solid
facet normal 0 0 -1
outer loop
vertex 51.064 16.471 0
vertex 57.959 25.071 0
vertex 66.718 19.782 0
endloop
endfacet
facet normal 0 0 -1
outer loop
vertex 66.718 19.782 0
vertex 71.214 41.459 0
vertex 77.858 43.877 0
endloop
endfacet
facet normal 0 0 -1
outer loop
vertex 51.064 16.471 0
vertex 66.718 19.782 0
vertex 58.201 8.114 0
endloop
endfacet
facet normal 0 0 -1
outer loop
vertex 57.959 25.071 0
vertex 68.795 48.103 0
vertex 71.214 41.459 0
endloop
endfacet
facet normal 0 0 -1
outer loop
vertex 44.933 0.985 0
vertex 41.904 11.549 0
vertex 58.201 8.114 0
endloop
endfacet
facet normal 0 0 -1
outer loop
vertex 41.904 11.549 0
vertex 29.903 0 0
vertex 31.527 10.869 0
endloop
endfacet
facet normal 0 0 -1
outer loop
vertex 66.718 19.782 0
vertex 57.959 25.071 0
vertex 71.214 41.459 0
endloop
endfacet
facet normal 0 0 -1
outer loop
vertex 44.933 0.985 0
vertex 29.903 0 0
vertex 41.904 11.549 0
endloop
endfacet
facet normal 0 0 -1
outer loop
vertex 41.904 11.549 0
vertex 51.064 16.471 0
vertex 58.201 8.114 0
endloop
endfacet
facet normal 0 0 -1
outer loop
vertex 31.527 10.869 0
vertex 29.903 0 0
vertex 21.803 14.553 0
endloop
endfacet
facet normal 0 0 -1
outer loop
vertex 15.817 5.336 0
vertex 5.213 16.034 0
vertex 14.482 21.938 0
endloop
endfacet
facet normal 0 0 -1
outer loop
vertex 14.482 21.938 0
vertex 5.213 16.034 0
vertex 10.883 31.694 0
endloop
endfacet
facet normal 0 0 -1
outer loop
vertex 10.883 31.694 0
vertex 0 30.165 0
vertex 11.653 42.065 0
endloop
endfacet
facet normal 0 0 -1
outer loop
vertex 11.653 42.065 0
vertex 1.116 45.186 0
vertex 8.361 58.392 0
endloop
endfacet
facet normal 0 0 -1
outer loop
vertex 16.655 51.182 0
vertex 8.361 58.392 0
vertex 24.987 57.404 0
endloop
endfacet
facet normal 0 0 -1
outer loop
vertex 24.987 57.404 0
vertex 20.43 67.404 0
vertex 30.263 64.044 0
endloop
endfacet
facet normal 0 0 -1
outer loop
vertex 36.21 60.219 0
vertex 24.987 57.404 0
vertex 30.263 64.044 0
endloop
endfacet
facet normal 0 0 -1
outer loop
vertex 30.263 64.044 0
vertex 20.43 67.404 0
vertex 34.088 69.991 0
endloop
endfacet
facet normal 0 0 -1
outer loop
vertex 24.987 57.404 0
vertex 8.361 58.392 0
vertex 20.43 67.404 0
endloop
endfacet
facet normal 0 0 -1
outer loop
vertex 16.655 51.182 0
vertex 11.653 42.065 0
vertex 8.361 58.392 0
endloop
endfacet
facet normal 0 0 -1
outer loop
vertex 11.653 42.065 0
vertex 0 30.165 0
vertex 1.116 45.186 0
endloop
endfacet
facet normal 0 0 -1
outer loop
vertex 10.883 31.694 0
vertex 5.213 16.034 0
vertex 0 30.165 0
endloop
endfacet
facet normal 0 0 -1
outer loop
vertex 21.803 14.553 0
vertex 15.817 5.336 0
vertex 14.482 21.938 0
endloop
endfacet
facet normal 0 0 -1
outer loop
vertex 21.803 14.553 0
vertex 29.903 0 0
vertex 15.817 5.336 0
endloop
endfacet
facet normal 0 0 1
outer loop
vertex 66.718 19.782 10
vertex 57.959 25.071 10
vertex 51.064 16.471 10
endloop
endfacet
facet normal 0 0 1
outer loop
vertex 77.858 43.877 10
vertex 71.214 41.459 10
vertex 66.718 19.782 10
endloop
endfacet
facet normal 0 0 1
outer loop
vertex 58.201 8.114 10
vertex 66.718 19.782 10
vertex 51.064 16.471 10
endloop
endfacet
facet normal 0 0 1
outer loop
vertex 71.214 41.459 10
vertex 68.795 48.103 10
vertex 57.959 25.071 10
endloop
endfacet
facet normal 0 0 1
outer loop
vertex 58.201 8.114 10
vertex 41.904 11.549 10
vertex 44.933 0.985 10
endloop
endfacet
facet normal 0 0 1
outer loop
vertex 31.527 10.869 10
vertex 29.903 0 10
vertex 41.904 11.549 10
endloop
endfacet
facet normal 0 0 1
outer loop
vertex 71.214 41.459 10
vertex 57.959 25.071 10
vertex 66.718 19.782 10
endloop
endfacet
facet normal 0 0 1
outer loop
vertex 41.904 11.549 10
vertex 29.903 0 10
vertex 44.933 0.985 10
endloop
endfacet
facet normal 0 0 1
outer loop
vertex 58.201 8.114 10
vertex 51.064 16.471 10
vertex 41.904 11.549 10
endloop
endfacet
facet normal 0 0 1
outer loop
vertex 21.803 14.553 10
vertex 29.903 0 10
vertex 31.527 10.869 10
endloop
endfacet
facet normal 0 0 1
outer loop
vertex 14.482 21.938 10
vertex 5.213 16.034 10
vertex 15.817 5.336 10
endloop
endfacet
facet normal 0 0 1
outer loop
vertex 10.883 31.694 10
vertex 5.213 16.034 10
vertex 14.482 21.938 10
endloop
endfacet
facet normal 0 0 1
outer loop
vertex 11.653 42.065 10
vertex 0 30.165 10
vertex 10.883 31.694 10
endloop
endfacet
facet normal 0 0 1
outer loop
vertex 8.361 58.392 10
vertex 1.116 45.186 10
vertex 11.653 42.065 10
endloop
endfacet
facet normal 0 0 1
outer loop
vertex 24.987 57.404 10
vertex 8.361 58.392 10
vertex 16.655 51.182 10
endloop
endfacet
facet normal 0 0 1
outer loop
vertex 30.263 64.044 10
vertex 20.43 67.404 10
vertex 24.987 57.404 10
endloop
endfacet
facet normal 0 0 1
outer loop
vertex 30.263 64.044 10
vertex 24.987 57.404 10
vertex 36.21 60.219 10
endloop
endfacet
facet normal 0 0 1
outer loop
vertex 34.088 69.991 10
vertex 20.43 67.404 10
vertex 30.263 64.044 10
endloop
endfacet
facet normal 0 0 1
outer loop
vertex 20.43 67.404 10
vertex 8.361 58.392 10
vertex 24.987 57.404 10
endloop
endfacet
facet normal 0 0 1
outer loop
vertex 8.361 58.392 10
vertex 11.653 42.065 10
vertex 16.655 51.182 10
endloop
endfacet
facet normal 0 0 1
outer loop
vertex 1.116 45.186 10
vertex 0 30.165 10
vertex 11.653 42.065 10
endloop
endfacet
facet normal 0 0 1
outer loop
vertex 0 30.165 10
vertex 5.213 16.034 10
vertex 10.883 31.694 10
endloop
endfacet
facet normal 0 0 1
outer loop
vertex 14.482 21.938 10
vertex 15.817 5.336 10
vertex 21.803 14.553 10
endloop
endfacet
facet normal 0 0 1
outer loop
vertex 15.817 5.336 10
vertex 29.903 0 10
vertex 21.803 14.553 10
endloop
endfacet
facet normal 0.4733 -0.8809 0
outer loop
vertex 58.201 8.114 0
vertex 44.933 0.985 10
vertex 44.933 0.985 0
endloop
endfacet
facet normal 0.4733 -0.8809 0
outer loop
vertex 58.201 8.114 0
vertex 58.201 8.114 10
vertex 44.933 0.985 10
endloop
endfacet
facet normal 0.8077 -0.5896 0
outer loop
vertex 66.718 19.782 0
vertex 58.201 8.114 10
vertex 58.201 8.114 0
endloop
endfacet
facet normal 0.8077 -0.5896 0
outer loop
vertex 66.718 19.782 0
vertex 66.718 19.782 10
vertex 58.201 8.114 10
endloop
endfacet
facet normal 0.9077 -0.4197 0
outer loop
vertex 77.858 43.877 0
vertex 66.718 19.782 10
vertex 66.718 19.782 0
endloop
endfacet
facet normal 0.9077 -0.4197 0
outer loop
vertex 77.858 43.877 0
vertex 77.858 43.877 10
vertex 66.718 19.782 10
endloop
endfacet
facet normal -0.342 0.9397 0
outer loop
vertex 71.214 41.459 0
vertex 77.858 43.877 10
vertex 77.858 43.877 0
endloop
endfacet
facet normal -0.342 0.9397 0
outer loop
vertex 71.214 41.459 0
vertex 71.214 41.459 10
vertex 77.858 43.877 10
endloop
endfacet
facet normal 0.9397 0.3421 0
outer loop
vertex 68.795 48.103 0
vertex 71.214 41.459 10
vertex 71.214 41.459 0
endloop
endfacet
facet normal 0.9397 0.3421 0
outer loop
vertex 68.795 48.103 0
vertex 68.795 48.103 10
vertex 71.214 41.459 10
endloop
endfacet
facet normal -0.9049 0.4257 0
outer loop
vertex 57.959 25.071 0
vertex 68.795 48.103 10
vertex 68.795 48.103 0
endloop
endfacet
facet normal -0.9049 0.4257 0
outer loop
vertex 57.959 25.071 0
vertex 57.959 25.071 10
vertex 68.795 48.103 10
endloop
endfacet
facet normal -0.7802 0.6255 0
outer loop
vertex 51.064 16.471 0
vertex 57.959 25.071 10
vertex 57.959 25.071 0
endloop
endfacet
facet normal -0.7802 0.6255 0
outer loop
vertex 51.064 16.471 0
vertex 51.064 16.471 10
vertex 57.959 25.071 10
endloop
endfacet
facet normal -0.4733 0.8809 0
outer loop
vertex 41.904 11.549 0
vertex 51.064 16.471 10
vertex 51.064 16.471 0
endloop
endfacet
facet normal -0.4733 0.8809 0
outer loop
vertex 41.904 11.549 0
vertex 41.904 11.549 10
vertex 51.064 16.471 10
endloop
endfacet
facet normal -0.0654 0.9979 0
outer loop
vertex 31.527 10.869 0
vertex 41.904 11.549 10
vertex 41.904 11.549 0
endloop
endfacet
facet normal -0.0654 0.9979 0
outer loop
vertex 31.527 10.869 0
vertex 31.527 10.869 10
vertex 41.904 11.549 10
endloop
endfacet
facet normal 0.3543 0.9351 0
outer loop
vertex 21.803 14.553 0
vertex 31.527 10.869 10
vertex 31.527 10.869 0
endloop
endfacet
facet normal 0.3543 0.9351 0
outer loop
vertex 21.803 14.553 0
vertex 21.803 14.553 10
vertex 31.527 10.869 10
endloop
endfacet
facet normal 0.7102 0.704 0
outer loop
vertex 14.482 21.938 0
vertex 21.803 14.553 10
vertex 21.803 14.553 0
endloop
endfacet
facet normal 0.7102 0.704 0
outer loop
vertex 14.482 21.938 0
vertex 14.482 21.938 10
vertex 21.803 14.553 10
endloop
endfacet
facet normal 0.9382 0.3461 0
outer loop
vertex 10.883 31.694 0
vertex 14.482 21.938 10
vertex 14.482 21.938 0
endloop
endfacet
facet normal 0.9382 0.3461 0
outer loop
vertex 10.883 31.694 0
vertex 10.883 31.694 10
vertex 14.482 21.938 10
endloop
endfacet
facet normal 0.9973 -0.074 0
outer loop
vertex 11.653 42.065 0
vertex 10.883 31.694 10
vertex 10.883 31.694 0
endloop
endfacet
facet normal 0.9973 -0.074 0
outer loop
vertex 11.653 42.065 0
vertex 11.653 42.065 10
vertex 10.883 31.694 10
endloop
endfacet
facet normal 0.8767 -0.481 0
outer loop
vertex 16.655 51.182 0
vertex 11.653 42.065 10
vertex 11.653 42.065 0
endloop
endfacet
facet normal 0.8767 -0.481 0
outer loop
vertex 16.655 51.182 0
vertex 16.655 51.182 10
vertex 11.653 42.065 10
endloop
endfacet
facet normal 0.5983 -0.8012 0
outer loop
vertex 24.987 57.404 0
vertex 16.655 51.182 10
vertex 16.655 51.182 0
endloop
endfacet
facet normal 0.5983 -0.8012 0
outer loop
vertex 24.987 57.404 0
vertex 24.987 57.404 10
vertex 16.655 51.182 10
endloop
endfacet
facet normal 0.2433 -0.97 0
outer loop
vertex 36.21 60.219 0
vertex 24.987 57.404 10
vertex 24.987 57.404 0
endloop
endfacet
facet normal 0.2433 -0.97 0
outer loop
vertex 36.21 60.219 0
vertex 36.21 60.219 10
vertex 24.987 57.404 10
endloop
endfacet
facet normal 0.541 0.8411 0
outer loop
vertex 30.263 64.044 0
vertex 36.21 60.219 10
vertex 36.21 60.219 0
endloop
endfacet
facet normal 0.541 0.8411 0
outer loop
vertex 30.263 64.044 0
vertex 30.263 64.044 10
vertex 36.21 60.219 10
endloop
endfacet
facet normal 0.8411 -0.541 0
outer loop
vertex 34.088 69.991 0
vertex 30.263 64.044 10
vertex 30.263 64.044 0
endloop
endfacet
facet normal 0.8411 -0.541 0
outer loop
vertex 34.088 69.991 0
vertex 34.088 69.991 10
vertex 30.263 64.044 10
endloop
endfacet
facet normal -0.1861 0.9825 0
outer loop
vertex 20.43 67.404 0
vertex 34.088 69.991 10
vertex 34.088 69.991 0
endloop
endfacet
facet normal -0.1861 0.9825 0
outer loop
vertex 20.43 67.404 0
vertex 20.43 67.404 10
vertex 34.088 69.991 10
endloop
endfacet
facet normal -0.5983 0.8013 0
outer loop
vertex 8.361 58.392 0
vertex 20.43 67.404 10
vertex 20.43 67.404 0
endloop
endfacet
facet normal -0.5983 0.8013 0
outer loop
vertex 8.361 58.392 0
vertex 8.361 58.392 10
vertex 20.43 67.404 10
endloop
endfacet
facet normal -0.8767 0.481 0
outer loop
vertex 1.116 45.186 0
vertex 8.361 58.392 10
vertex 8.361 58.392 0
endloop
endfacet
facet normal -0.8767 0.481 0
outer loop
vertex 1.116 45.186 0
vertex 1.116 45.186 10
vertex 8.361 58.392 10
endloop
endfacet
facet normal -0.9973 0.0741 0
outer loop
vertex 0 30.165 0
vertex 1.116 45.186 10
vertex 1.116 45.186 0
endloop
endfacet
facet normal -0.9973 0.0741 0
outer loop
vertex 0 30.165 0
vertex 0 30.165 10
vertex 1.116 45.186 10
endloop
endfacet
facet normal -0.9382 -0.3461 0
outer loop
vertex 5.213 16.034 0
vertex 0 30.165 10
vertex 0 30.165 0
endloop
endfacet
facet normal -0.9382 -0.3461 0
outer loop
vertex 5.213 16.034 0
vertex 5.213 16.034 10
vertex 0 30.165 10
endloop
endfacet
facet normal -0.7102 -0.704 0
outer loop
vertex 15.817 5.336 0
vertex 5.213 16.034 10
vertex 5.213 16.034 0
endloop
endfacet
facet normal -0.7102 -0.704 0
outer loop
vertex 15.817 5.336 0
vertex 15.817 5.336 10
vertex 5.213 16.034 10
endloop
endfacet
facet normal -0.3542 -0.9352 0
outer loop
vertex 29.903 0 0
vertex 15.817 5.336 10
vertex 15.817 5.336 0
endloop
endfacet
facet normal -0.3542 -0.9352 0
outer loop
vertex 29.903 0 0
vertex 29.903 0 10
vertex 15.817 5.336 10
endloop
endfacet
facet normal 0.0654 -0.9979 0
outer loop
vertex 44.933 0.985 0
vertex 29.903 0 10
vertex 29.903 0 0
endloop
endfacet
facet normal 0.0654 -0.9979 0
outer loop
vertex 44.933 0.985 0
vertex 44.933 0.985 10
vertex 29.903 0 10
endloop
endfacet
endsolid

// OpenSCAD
$fn = 32;

// ----------------------------------------------------------------------
// Hook plate: curl radius 30 mm over 245 degrees, 10 mm thick band
// ----------------------------------------------------------------------

// --- parameters (mm) ---
profile_height = 10;      // extrusion height
profile_points = 26;      // points of the closed outline

profile = [[30.263, 64.044], [34.088, 69.991], [20.43, 67.404], [8.361, 58.392], [1.116, 45.186], [0, 30.165], [5.213, 16.034], [15.817, 5.336], [29.903, 0], [44.933, 0.985], [58.201, 8.114], [66.718, 19.782], [77.858, 43.877], [71.214, 41.459], [68.795, 48.103], [57.959, 25.071], [51.064, 16.471], [41.904, 11.549], [31.527, 10.869], [21.803, 14.553], [14.482, 21.938], [10.883, 31.694], [11.653, 42.065], [16.655, 51.182], [24.987, 57.404], [36.21, 60.219]];  // single closed polygon, 26 points, counter clockwise

// --- the one profile operation ---
linear_extrude(height = profile_height) polygon(points = profile);
